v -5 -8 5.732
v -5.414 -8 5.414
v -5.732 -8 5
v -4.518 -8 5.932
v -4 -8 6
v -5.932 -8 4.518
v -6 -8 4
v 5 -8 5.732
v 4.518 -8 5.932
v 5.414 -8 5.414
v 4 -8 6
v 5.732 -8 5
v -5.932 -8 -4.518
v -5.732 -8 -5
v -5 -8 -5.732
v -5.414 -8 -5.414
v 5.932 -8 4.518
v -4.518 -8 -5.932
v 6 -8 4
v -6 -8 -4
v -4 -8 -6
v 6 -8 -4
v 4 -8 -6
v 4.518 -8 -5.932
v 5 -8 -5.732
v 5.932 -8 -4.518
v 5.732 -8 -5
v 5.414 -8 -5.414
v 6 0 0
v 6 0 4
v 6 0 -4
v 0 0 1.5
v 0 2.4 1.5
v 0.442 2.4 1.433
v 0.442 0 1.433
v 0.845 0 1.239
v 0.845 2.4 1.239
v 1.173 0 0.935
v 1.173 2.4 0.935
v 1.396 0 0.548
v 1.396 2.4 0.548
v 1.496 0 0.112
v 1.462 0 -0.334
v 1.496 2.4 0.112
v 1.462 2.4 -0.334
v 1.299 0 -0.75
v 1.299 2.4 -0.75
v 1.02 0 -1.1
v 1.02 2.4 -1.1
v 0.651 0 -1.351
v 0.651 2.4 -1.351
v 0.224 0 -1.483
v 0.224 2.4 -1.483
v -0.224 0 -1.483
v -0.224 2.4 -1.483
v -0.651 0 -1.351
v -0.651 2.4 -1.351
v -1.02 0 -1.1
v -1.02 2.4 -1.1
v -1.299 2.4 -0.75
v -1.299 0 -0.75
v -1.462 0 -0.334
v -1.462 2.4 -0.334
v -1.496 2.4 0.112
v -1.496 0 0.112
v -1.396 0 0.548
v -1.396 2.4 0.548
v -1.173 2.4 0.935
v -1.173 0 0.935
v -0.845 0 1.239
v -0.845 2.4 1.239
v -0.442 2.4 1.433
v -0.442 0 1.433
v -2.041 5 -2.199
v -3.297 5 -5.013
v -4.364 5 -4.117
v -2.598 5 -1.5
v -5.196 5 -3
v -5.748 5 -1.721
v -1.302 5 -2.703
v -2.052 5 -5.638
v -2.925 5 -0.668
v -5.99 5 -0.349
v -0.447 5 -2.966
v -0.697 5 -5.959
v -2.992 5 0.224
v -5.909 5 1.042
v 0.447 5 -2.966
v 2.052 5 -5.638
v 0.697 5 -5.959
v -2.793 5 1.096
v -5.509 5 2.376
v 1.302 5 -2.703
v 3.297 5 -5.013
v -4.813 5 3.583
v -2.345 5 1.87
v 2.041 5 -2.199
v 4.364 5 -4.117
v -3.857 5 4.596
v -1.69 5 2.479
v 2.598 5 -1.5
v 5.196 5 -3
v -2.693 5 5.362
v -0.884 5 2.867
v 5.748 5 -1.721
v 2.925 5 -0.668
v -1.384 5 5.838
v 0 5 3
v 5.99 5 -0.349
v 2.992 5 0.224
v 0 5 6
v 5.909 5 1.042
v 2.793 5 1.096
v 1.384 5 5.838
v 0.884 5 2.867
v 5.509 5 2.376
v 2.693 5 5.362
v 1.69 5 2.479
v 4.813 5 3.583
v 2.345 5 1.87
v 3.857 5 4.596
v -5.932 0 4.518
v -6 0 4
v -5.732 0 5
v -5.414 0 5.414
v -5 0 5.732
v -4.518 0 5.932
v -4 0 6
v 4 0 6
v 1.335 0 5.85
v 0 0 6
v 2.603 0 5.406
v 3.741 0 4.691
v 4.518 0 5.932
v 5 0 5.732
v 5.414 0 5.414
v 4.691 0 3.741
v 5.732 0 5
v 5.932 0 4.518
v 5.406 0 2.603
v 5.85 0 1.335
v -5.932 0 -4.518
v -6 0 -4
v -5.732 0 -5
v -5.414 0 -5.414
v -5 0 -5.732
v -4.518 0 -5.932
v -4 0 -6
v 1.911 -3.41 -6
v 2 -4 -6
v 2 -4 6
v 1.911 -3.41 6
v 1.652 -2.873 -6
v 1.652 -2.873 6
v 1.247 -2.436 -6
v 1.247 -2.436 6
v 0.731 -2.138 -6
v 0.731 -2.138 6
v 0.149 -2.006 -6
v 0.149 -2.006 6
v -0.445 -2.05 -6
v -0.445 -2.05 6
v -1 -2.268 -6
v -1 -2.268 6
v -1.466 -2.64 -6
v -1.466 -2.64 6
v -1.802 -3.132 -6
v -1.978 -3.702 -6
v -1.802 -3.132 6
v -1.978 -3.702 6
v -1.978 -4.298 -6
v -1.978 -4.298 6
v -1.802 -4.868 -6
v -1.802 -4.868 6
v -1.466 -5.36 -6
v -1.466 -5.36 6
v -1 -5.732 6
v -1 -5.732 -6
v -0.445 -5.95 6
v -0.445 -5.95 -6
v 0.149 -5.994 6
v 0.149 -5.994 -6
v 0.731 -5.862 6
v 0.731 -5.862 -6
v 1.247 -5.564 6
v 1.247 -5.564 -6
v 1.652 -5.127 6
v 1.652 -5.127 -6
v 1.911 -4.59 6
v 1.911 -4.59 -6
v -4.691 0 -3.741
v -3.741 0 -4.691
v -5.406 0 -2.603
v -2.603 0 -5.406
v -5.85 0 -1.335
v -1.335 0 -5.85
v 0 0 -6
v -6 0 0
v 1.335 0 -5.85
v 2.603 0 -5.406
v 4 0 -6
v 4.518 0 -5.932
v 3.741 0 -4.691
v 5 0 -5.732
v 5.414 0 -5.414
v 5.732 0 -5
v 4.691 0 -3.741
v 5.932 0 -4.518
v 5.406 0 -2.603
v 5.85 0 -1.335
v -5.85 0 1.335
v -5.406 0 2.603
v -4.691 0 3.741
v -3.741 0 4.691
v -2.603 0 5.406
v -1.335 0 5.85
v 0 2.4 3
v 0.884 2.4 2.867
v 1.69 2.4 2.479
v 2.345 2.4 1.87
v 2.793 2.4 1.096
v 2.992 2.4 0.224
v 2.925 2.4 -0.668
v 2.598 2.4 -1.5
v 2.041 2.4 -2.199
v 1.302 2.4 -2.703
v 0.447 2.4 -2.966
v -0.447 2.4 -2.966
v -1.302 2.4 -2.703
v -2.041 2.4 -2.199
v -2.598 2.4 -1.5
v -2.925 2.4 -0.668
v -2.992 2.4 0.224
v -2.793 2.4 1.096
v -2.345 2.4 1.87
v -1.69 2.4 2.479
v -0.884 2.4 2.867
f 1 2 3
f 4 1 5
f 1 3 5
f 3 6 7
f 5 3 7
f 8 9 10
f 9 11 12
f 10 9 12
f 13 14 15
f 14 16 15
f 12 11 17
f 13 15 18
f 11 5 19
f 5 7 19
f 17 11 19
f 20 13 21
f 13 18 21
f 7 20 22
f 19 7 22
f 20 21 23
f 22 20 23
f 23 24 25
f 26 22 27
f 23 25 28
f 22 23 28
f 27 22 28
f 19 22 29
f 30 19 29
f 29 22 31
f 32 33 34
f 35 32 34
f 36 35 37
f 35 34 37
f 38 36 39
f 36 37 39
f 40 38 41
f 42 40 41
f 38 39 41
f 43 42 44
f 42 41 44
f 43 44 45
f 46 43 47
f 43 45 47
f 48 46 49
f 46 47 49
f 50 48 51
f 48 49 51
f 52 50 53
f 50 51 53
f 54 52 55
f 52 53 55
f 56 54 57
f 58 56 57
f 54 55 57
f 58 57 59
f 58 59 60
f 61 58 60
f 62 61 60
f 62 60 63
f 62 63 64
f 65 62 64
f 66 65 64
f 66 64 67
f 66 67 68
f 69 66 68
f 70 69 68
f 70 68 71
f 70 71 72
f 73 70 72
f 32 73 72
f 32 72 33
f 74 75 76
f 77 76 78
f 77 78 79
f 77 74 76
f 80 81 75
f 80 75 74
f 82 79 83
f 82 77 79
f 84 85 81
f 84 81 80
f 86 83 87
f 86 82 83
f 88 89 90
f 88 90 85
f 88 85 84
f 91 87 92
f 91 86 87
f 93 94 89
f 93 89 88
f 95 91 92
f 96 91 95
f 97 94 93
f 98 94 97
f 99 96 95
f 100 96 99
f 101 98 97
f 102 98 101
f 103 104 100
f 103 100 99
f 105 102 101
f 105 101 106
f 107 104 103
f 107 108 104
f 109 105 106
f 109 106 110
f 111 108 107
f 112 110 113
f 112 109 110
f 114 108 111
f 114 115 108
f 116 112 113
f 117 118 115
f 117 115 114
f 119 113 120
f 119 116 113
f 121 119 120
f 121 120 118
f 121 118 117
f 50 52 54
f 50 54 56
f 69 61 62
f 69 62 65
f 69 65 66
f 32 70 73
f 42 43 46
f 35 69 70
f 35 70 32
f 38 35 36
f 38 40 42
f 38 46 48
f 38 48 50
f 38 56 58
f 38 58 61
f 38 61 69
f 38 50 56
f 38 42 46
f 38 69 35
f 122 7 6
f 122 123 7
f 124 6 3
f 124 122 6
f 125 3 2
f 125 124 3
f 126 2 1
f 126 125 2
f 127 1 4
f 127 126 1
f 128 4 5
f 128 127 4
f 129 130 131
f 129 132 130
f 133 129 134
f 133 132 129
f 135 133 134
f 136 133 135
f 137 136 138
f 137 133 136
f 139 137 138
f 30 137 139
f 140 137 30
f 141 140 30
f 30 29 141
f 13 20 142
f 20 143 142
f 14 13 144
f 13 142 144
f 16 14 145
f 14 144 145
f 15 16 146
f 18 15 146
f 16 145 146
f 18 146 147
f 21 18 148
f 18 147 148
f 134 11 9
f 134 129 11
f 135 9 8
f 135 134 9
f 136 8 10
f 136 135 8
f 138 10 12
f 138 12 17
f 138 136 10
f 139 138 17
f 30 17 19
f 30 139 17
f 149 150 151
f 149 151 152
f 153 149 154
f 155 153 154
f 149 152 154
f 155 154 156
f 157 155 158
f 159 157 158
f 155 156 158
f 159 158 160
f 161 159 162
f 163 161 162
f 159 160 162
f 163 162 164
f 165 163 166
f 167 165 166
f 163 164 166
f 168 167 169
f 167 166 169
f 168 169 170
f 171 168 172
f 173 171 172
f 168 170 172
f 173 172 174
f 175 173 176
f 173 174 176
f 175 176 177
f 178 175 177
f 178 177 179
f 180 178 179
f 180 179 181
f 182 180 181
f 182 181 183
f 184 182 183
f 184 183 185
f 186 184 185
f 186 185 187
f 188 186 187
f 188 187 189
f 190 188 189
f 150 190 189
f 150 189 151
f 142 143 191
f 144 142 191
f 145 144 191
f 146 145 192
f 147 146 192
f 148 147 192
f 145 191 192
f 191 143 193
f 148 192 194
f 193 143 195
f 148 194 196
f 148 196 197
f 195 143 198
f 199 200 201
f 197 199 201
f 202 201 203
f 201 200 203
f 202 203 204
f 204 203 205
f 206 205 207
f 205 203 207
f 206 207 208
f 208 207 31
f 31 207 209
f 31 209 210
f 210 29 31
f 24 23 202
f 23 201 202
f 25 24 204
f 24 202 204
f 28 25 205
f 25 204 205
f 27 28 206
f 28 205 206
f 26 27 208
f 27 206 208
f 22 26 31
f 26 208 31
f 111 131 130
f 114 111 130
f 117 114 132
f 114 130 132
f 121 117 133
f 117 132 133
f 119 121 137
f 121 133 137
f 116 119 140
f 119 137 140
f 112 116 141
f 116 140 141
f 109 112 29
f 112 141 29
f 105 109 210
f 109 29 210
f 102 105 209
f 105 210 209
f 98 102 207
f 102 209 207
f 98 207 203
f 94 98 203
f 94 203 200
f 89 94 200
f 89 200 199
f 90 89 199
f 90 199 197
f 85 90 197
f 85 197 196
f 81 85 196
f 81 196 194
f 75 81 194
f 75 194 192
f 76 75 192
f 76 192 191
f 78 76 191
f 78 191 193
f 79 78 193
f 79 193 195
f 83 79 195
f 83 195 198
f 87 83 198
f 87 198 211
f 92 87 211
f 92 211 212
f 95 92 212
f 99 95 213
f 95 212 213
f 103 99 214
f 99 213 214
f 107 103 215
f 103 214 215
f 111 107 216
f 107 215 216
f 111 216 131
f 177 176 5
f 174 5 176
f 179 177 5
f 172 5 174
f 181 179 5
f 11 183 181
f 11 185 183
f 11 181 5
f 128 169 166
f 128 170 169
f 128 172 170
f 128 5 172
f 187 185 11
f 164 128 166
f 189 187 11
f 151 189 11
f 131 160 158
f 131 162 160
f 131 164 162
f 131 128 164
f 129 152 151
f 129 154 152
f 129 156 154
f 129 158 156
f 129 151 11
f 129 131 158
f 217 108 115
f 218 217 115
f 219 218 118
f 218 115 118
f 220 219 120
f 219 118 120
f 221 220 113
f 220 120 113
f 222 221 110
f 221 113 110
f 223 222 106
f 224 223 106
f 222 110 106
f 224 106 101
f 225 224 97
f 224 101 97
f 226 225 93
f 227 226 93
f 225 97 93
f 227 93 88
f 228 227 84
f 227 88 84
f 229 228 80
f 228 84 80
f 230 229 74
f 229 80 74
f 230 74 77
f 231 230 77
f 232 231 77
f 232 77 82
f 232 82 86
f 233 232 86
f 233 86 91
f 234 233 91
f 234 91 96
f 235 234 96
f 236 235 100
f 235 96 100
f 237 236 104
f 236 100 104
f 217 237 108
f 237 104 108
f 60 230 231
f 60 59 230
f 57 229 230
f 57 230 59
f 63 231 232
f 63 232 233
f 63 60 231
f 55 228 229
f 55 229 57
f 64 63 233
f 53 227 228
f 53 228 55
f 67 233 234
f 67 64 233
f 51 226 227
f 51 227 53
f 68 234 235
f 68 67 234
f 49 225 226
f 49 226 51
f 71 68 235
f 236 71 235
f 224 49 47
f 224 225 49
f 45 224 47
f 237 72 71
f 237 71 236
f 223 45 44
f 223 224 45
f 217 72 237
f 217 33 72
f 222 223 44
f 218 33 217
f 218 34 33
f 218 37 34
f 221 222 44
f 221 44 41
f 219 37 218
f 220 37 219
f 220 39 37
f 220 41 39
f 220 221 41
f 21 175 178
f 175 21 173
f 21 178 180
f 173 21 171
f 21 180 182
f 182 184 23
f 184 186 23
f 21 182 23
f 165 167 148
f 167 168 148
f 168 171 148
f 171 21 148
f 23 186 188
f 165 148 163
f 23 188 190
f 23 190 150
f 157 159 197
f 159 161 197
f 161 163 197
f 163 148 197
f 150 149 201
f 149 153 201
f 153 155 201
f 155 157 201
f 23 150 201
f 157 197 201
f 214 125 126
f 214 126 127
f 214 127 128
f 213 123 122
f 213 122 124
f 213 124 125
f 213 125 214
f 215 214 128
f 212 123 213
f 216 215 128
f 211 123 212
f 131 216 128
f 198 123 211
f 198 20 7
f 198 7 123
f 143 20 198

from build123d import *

# Parameters (mm, degrees)
SKETCH_1_R          = 6
EXTRUDE_1_DEPTH     = 5
SKETCH_2_W          = 12
SKETCH_2_H          = 8
EXTRUDE_2_DEPTH     = 6
SKETCH_2_2_W        = 12
SKETCH_2_2_H        = 8
EXTRUDE_3_DEPTH     = 6
SKETCH_3_R          = 2
CUT_EXTRUDE_1_DEPTH = 16.620499352
SKETCH_4_R          = 1.5
CUT_EXTRUDE_2_DEPTH = 5
FILLET_1_R          = 2
SKETCH_5_R          = 3
CUT_EXTRUDE_4_DEPTH = 2.6


with BuildPart() as part:
    # 草图1 → 凸台-拉伸1 (new body)
    with BuildSketch(Plane(origin=(0, 0, 0), x_dir=(1, 0, 0), z_dir=(0, 1, 0))):
        Circle(SKETCH_1_R)
    extrude(amount=EXTRUDE_1_DEPTH)

    # 草图2 → 凸台-拉伸2 (add)
    with BuildSketch(Plane.XY):
        with Locations((0, -4)):
            Rectangle(SKETCH_2_W, SKETCH_2_H)
    extrude(amount=-EXTRUDE_2_DEPTH)

    # 草图2<2> → 凸台-拉伸3 (add)
    with BuildSketch(Plane.XY):
        with Locations((0, -4)):
            Rectangle(SKETCH_2_2_W, SKETCH_2_2_H)
    extrude(amount=EXTRUDE_3_DEPTH)

    # 草图3 → 切除-拉伸1 (cut, through all)
    with BuildSketch(Plane.XY.offset(6)):
        with Locations((0, -4)):
            Circle(SKETCH_3_R)
    extrude(amount=-CUT_EXTRUDE_1_DEPTH, mode=Mode.SUBTRACT)

    # 草图4 → 切除-拉伸2 (cut)
    with BuildSketch(Plane(origin=(0, 5, 0), x_dir=(1, 0, 0), z_dir=(0, 1, 0))):
        Circle(SKETCH_4_R)
    extrude(amount=-CUT_EXTRUDE_2_DEPTH, mode=Mode.SUBTRACT)

    # 圆角1
    fillet_1_edges = [part.edges().sort_by_distance(p)[0] for p in [
        (-6, -4, -6),
        (6, -4, -6),
        (6, -4, 6),
        (-6, -4, 6),
    ]]
    fillet(fillet_1_edges, radius=FILLET_1_R)

    # 草图5 → 切除-拉伸4 (cut)
    with BuildSketch(Plane(origin=(0, 5, 0), x_dir=(1, 0, 0), z_dir=(0, 1, 0))):
        Circle(SKETCH_5_R)
    extrude(amount=-CUT_EXTRUDE_4_DEPTH, mode=Mode.SUBTRACT)


solid = part.part
